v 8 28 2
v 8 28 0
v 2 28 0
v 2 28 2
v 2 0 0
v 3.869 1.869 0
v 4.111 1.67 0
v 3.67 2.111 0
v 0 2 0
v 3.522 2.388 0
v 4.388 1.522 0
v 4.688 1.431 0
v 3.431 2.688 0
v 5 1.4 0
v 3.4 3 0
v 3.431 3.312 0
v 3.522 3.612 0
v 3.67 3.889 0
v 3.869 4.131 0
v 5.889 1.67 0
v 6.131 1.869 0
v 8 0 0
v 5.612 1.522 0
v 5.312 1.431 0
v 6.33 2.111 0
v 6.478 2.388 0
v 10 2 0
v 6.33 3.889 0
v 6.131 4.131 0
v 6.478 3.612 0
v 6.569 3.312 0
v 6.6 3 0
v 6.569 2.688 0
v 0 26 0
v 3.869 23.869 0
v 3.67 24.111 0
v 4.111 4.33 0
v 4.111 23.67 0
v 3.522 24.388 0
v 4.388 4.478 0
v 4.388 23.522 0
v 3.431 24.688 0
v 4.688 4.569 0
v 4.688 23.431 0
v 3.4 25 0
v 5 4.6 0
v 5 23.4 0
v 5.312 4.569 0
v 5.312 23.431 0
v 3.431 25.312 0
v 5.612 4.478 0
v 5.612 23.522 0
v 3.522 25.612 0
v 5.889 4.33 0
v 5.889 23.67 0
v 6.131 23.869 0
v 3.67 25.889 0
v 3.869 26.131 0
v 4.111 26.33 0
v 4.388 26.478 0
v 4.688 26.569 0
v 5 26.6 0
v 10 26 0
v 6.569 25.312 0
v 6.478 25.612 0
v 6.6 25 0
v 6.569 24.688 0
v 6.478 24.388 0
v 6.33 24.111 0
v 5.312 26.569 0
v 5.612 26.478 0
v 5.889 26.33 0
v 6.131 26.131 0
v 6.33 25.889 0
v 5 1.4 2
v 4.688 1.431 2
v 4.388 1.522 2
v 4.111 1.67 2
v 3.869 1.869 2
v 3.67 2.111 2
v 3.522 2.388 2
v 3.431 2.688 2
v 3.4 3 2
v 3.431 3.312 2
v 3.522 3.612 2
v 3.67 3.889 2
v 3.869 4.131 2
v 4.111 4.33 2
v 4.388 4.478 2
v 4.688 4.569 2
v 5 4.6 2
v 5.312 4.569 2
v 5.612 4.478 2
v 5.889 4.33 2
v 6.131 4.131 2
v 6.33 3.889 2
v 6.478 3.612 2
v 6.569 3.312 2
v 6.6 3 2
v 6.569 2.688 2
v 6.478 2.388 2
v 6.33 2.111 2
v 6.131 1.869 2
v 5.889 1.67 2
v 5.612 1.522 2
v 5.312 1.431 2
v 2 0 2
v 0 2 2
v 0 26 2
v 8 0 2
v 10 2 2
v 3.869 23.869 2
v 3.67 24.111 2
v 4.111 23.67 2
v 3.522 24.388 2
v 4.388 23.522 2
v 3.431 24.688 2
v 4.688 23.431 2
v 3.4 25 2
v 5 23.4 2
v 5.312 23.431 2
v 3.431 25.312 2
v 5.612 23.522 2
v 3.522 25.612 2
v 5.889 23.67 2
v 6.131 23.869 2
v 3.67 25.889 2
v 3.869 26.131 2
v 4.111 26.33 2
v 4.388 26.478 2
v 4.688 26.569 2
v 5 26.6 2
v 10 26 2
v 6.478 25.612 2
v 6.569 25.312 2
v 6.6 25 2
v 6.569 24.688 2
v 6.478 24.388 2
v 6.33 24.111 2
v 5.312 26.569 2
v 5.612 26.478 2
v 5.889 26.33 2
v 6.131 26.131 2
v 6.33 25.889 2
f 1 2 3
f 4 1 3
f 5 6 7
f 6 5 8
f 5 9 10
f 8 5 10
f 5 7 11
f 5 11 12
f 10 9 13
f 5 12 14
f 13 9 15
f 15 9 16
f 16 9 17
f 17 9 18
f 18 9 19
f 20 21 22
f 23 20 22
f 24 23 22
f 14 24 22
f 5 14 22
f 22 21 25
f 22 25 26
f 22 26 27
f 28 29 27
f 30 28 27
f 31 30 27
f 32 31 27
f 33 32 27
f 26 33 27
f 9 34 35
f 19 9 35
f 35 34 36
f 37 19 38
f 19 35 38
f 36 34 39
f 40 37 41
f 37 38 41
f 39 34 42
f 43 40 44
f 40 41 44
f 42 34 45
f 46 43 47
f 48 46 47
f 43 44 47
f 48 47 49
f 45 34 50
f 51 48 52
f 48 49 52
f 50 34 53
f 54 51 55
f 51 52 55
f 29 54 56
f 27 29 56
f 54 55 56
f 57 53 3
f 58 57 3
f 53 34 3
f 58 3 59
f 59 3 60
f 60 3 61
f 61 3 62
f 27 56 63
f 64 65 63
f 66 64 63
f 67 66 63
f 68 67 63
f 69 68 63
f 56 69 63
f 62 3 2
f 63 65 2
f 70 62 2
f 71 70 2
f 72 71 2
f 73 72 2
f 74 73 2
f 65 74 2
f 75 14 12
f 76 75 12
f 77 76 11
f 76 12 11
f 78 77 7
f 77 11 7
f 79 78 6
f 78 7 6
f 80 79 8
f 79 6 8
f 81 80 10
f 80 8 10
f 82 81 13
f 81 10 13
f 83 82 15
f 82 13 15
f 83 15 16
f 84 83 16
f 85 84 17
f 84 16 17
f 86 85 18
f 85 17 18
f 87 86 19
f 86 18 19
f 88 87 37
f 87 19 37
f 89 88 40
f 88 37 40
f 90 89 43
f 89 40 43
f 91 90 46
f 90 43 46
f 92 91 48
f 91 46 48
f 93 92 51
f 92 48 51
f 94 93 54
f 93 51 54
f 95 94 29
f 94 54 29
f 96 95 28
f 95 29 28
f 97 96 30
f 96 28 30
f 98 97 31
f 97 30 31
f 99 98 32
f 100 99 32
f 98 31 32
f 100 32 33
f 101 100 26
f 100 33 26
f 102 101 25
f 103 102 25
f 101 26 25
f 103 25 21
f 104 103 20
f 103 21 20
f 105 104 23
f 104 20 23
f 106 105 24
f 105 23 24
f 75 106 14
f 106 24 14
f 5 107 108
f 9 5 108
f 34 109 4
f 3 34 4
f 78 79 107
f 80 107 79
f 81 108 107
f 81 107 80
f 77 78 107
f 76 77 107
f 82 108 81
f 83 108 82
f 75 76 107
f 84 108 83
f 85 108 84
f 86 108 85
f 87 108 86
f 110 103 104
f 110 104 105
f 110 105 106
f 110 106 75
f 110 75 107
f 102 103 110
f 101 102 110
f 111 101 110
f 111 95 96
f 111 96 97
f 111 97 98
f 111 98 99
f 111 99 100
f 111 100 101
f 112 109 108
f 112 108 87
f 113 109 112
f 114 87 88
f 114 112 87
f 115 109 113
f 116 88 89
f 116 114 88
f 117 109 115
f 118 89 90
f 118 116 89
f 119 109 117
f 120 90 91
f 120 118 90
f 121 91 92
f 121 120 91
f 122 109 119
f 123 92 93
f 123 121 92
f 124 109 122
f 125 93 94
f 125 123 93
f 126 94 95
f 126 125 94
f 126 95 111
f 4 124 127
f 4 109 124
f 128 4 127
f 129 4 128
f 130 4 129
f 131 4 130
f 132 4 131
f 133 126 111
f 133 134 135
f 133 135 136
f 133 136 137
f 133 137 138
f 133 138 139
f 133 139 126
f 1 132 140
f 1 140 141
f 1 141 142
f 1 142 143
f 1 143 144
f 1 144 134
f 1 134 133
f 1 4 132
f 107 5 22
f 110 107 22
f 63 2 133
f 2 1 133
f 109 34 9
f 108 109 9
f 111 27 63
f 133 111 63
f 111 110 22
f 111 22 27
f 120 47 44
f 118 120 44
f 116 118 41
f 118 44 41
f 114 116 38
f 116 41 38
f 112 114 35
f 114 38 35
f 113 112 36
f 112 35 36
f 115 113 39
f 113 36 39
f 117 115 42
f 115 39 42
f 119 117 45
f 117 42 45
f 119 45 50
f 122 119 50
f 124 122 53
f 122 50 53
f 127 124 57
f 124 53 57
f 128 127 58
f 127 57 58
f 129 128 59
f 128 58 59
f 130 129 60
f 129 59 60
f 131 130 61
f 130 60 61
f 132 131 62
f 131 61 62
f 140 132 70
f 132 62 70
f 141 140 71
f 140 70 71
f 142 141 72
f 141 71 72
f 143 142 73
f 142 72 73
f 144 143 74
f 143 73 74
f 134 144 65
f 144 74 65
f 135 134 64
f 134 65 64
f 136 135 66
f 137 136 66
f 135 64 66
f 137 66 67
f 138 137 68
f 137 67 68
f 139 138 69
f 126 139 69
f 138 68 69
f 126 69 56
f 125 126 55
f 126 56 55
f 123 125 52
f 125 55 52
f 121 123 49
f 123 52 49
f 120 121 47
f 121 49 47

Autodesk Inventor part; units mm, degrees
ref_plane "YZ Plane" through (0, 0, 0) normal (1, 0, 0) x (0, 1, 0)
ref_plane "XZ Plane" through (0, 0, 0) normal (0, 1, 0) x (-1, 0, 0)
ref_plane "XY Plane" through (0, 0, 0) normal (0, 0, 1) x (1, 0, 0)
sketch "スケッチ1" plane through (0, 0, 0) normal (0, 0, 1) x (1, 0, 0)
  line L0 (0, 0) -> (10, 0)
  line L1 (10, 0) -> (10, 28)
  line L2 (10, 28) -> (0, 28)
  line L3 (0, 28) -> (0, 0)
  dimension "d0" = 10
  dimension "d1" = 28
extrude "押し出し1" add sketch "スケッチ1" along normal blind 2
sketch "スケッチ2" plane through (0, 0, 2) normal (0, 0, 1) x (1, 0, 0)
  line L0 (10, 28) -> (0, 28) projected
  line L1 (10, 0) -> (10, 28) projected
  line L2 (0, 0) -> (10, 0) projected
  point P0 (5, 3)
  dimension "d6" = 5
  dimension "d7" = 3
hole "穴1" at (5, 3, 2) direction (0, 0, -1) diameter 3.2 end through all
sketch "スケッチ7" plane through (0, 0, 2) normal (0, 0, 1) x (1, 0, 0)
  line L0 (10, 0) -> (10, 28) projected
  line L1 (10, 28) -> (0, 28) projected
  point P0 (0, 0)
  point P1 (5, 25)
  point P2 (6, 3)
  point P3 (6, 27)
  point P4 (5, 28)
  point P5 (1, 28)
  point P6 (6, 2)
  dimension "d43" = 5
  dimension "d44" = 3
hole "穴2" at (5, 25, 2) direction (0, 0, -1) diameter 3.2 end through all
sketch "スケッチ8" plane through (0, 0, 2) normal (0, 0, 1) x (1, 0, 0)
  line L0 (10, 28) -> (0, 28) projected
  line L1 (8, 28) -> (10, 26)
  line L2 (10, 0) -> (10, 28) projected
  line L3 (0, 28) -> (0, 0) projected
  line L4 (0, 26) -> (2, 28)
  line L5 (0, 0) -> (10, 0) projected
  line L6 (2, 0) -> (0, 2)
  line L7 (8, 0) -> (10, 2)
  dimension "d45" = 2
  dimension "d46" = 2
  dimension "d49" = 2
  dimension "d50" = 2
  dimension "d51" = 2
  dimension "d52" = 2
  dimension "d53" = 2
  dimension "d54" = 2
extrude "押し出し5" cut sketch "スケッチ8" against normal blind 10 contours L2 L1 L0 | L4 L3 L0 | L2 L5 L7 | L6 L5 L3
properties part number "リンク26×6×2"
